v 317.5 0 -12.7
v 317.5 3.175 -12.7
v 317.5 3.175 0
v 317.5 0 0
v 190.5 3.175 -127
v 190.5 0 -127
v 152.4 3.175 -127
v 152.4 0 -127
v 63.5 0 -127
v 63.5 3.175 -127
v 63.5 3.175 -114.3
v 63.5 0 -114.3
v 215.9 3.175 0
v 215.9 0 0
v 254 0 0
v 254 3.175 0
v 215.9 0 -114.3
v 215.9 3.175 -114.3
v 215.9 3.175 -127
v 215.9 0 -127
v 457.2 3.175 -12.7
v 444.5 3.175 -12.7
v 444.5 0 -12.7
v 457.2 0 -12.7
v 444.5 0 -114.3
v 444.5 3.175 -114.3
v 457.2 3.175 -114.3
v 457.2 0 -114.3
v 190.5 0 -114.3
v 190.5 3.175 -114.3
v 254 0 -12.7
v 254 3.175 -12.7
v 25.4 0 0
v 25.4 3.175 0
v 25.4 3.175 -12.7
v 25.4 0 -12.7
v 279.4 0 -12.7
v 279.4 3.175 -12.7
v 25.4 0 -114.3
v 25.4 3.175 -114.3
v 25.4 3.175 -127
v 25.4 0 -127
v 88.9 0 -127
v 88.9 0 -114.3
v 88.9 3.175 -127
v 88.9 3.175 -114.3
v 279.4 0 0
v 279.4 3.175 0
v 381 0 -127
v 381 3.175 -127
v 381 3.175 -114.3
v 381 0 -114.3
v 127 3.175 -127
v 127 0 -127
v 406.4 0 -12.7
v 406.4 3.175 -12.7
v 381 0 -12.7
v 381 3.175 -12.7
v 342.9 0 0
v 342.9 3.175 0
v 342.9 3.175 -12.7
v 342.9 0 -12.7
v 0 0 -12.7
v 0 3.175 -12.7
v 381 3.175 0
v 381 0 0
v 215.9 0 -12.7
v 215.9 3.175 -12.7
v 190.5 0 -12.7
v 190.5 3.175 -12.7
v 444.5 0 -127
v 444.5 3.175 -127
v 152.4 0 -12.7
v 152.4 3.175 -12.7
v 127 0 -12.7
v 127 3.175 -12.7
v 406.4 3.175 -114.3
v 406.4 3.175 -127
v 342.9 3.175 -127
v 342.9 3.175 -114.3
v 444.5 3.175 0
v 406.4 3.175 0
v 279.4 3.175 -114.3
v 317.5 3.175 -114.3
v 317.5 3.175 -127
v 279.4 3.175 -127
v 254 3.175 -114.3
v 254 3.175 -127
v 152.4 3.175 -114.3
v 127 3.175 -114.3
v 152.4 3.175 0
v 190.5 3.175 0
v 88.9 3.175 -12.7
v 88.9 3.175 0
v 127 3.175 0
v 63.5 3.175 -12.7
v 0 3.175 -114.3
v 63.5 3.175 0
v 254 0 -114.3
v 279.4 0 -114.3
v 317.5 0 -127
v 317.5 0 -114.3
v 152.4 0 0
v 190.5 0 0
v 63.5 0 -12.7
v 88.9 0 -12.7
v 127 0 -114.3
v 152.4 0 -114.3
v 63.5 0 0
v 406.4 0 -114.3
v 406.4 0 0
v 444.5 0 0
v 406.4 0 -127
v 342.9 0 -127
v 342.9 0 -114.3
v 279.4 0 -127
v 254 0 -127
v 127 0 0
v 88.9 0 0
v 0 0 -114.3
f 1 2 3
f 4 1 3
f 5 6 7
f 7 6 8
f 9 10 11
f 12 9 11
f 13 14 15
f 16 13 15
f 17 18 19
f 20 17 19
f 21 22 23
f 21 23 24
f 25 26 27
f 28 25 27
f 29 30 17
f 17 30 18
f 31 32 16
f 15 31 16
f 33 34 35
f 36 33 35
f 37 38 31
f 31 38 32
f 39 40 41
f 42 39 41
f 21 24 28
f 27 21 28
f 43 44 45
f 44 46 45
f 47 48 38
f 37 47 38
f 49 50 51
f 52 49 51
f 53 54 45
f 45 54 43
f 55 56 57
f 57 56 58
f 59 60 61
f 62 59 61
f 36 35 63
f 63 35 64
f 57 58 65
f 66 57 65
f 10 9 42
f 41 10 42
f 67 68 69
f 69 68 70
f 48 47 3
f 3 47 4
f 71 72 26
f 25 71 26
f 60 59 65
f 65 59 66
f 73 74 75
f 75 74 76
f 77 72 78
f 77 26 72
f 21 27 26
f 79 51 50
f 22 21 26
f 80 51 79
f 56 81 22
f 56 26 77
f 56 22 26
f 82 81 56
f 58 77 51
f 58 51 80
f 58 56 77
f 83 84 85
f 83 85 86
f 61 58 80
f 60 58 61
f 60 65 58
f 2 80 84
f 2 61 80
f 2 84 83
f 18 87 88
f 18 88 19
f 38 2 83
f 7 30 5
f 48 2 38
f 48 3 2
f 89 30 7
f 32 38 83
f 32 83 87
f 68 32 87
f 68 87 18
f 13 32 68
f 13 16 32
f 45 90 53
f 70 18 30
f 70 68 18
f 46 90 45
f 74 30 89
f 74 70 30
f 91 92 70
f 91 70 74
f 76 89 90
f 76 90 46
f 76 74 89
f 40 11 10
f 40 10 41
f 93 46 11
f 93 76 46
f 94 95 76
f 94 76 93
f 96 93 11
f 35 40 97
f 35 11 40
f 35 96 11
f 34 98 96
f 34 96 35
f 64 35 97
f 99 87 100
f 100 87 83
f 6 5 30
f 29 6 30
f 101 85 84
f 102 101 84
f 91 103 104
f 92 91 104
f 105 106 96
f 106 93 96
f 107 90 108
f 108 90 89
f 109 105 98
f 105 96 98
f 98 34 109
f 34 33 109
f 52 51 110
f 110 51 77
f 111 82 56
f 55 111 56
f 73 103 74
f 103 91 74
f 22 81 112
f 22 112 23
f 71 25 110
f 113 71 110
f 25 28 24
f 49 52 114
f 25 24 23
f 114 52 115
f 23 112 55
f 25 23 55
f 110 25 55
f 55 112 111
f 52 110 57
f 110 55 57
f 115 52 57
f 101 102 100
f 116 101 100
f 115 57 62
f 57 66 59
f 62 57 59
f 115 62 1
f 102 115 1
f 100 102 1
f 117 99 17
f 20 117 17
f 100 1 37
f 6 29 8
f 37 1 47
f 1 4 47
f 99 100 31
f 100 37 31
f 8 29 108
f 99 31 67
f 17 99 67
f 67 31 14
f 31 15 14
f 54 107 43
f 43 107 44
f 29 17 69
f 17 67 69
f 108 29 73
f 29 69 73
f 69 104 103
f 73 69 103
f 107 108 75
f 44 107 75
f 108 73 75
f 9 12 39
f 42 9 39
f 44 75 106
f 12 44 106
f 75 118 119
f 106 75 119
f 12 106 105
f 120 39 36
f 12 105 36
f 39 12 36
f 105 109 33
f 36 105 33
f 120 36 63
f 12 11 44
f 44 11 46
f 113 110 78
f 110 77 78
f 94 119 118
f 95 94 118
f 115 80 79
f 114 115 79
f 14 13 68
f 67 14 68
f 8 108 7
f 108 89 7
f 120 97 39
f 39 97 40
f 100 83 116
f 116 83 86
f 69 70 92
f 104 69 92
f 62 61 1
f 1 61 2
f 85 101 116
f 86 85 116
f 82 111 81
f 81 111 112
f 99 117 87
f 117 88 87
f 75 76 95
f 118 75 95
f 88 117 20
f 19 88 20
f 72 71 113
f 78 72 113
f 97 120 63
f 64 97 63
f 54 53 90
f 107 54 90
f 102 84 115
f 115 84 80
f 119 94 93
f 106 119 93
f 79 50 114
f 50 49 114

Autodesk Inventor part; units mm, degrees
ref_plane "YZ Plane" through (0, 0, 0) normal (1, 0, 0) x (0, 1, 0)
ref_plane "XZ Plane" through (0, 0, 0) normal (0, 1, 0) x (-1, 0, 0)
ref_plane "XY Plane" through (0, 0, 0) normal (0, 0, 1) x (1, 0, 0)
sketch "Sketch1" plane through (0, 0, 0) normal (0, 1, 0) x (-1, 0, 0)
  line L0 (0, 0) -> (-457.2, 0)
  line L1 (-457.2, 0) -> (-457.2, -127)
  line L2 (-457.2, -127) -> (0, -127)
  line L3 (0, -127) -> (0, 0)
  dimension "d0" = 457.2
  dimension "d1" = 127
extrude "Extrusion1" add sketch "Sketch1" along normal blind 3.175
sketch "Sketch2" plane through (0, 3.175, 0) normal (0, 1, 0) x (1, 0, 0)
  line L0 (0, 127) -> (0, 0) projected
  line L1 (0, 114.3) -> (25.4, 114.3)
  line L2 (25.4, 114.3) -> (25.4, 127)
  line L3 (457.2, 127) -> (0, 127) projected
  line L4 (63.5, 127) -> (63.5, 114.3)
  line L5 (63.5, 114.3) -> (88.9, 114.3)
  line L6 (88.9, 114.3) -> (88.9, 127)
  line L7 (127, 127) -> (127, 114.3)
  line L8 (127, 114.3) -> (152.4, 114.3)
  line L9 (152.4, 114.3) -> (152.4, 127)
  line L10 (190.5, 127) -> (190.5, 114.3)
  line L11 (190.5, 114.3) -> (215.9, 114.3)
  line L12 (215.9, 114.3) -> (215.9, 127)
  line L13 (254, 127) -> (254, 114.3)
  line L14 (254, 114.3) -> (279.4, 114.3)
  line L15 (279.4, 114.3) -> (279.4, 127)
  line L16 (317.5, 127) -> (317.5, 114.3)
  line L17 (317.5, 114.3) -> (342.9, 114.3)
  line L18 (342.9, 114.3) -> (342.9, 127)
  line L19 (381, 127) -> (381, 114.3)
  line L20 (381, 114.3) -> (406.4, 114.3)
  line L21 (406.4, 114.3) -> (406.4, 127)
  line L22 (444.5, 127) -> (444.5, 114.3)
  line L23 (444.5, 114.3) -> (457.2, 114.3)
  line L24 (457.2, 0) -> (457.2, 127) projected
  line L25 (0, 114.3) -> (0, 127)
  line L26 (63.5, 127) -> (88.9, 127)
  line L27 (127, 127) -> (152.4, 127)
  line L28 (190.5, 127) -> (215.9, 127)
  line L29 (254, 127) -> (279.4, 127)
  line L30 (317.5, 127) -> (342.9, 127)
  line L31 (381, 127) -> (406.4, 127)
  line L32 (444.5, 127) -> (457.2, 127)
  line L33 (0, 127) -> (25.4, 127)
  point P0 (457.2, 114.3)
  point P1 (25.4, 127)
  dimension "d4" = 25.4
  dimension "d6" = 12.7
  dimension "d7" = 12.7
  dimension "d8" = 12.7
  dimension "d9" = 25.4
  dimension "d10" = 38.1
  dimension "d11" = 25.4
  dimension "d12" = 38.1
  dimension "d13" = 25.4
  dimension "d14" = 38.1
  dimension "d15" = 25.4
  dimension "d16" = 38.1
  dimension "d17" = 25.4
  dimension "d18" = 38.1
  dimension "d19" = 25.4
  dimension "d20" = 38.1
  dimension "d21" = 12.7
  dimension "d22" = 0
  dimension "d42" = 12.7
extrude "Extrusion2" cut sketch "Sketch2" against normal through all
sketch "Sketch3" plane through (0, 3.175, 0) normal (0, 1, 0) x (1, 0, 0)
  line L0 (0, 0) -> (457.2, 0) projected
  line L1 (0, 0) -> (25.4, 0)
  line L2 (25.4, 0) -> (25.4, 12.7)
  line L3 (25.4, 12.7) -> (0, 12.7)
  line L4 (0, 12.7) -> (0, 0)
  line L5 (63.5, 0) -> (88.9, 0)
  line L6 (88.9, 0) -> (88.9, 12.7)
  line L7 (88.9, 12.7) -> (63.5, 12.7)
  line L8 (63.5, 12.7) -> (63.5, 0)
  line L9 (127, 0) -> (152.4, 0)
  line L10 (152.4, 0) -> (152.4, 12.7)
  line L11 (152.4, 12.7) -> (127, 12.7)
  line L12 (127, 12.7) -> (127, 0)
  line L13 (190.5, 0) -> (215.9, 0)
  line L14 (215.9, 0) -> (215.9, 12.7)
  line L15 (215.9, 12.7) -> (190.5, 12.7)
  line L16 (190.5, 12.7) -> (190.5, 0)
  line L17 (254, 0) -> (279.4, 0)
  line L18 (279.4, 0) -> (279.4, 12.7)
  line L19 (279.4, 12.7) -> (254, 12.7)
  line L20 (254, 12.7) -> (254, 0)
  line L21 (317.5, 0) -> (342.9, 0)
  line L22 (342.9, 0) -> (342.9, 12.7)
  line L23 (342.9, 12.7) -> (317.5, 12.7)
  line L24 (317.5, 12.7) -> (317.5, 0)
  line L25 (381, 0) -> (406.4, 0)
  line L26 (406.4, 0) -> (406.4, 12.7)
  line L27 (406.4, 12.7) -> (381, 12.7)
  line L28 (381, 12.7) -> (381, 0)
  line L29 (457.2, 0) -> (457.2, 114.3) projected
  line L30 (457.2, 0) -> (444.5, 0)
  line L31 (444.5, 0) -> (444.5, 12.7)
  line L32 (444.5, 12.7) -> (457.2, 12.7)
  line L33 (457.2, 12.7) -> (457.2, 0)
  dimension "d25" = 25.4
  dimension "d26" = 12.7
  dimension "d27" = 25.4
  dimension "d28" = 38.1
  dimension "d29" = 25.4
  dimension "d30" = 25.4
  dimension "d31" = 25.4
  dimension "d32" = 25.4
  dimension "d33" = 25.4
  dimension "d34" = 12.7
  dimension "d35" = 38.1
  dimension "d36" = 38.1
  dimension "d37" = 38.1
  dimension "d38" = 38.1
  dimension "d39" = 38.1
extrude "Extrusion3" cut sketch "Sketch3" against normal through all
properties part number "BridgeRoof"
